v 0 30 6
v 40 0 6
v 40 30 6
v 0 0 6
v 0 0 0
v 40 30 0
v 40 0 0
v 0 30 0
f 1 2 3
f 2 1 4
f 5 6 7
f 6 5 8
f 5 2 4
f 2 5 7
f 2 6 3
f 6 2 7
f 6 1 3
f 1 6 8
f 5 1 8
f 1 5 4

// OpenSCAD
// Preview vs production OpenSCAD mode pattern.
// Export only with mode="production".

mode = "preview";
preview = "preview";
production = "production";
cutaway = "cutaway";

is_preview = mode == "preview";
is_production = mode == "production";
is_cutaway = mode == "cutaway";

show_pcb_placeholder = true;
show_clearance_preview = true;

module printable_part() {
    cube([40, 30, 6]);
}

module pcb_placeholder() {
    %color([0.1, 0.4, 1.0, 0.25])
        translate([5, 5, 6])
            cube([30, 20, 1.6]);
}

module clearance_preview() {
    %color([0.2, 1.0, 0.2, 0.20])
        translate([3, 3, 6])
            cube([34, 24, 8]);
}

module production_geometry() {
    printable_part();
}

module preview_helpers() {
    if (is_preview && show_pcb_placeholder)
        pcb_placeholder();

    if (is_preview && show_clearance_preview)
        clearance_preview();
}

module main() {
    production_geometry();
    preview_helpers();
}

main();
